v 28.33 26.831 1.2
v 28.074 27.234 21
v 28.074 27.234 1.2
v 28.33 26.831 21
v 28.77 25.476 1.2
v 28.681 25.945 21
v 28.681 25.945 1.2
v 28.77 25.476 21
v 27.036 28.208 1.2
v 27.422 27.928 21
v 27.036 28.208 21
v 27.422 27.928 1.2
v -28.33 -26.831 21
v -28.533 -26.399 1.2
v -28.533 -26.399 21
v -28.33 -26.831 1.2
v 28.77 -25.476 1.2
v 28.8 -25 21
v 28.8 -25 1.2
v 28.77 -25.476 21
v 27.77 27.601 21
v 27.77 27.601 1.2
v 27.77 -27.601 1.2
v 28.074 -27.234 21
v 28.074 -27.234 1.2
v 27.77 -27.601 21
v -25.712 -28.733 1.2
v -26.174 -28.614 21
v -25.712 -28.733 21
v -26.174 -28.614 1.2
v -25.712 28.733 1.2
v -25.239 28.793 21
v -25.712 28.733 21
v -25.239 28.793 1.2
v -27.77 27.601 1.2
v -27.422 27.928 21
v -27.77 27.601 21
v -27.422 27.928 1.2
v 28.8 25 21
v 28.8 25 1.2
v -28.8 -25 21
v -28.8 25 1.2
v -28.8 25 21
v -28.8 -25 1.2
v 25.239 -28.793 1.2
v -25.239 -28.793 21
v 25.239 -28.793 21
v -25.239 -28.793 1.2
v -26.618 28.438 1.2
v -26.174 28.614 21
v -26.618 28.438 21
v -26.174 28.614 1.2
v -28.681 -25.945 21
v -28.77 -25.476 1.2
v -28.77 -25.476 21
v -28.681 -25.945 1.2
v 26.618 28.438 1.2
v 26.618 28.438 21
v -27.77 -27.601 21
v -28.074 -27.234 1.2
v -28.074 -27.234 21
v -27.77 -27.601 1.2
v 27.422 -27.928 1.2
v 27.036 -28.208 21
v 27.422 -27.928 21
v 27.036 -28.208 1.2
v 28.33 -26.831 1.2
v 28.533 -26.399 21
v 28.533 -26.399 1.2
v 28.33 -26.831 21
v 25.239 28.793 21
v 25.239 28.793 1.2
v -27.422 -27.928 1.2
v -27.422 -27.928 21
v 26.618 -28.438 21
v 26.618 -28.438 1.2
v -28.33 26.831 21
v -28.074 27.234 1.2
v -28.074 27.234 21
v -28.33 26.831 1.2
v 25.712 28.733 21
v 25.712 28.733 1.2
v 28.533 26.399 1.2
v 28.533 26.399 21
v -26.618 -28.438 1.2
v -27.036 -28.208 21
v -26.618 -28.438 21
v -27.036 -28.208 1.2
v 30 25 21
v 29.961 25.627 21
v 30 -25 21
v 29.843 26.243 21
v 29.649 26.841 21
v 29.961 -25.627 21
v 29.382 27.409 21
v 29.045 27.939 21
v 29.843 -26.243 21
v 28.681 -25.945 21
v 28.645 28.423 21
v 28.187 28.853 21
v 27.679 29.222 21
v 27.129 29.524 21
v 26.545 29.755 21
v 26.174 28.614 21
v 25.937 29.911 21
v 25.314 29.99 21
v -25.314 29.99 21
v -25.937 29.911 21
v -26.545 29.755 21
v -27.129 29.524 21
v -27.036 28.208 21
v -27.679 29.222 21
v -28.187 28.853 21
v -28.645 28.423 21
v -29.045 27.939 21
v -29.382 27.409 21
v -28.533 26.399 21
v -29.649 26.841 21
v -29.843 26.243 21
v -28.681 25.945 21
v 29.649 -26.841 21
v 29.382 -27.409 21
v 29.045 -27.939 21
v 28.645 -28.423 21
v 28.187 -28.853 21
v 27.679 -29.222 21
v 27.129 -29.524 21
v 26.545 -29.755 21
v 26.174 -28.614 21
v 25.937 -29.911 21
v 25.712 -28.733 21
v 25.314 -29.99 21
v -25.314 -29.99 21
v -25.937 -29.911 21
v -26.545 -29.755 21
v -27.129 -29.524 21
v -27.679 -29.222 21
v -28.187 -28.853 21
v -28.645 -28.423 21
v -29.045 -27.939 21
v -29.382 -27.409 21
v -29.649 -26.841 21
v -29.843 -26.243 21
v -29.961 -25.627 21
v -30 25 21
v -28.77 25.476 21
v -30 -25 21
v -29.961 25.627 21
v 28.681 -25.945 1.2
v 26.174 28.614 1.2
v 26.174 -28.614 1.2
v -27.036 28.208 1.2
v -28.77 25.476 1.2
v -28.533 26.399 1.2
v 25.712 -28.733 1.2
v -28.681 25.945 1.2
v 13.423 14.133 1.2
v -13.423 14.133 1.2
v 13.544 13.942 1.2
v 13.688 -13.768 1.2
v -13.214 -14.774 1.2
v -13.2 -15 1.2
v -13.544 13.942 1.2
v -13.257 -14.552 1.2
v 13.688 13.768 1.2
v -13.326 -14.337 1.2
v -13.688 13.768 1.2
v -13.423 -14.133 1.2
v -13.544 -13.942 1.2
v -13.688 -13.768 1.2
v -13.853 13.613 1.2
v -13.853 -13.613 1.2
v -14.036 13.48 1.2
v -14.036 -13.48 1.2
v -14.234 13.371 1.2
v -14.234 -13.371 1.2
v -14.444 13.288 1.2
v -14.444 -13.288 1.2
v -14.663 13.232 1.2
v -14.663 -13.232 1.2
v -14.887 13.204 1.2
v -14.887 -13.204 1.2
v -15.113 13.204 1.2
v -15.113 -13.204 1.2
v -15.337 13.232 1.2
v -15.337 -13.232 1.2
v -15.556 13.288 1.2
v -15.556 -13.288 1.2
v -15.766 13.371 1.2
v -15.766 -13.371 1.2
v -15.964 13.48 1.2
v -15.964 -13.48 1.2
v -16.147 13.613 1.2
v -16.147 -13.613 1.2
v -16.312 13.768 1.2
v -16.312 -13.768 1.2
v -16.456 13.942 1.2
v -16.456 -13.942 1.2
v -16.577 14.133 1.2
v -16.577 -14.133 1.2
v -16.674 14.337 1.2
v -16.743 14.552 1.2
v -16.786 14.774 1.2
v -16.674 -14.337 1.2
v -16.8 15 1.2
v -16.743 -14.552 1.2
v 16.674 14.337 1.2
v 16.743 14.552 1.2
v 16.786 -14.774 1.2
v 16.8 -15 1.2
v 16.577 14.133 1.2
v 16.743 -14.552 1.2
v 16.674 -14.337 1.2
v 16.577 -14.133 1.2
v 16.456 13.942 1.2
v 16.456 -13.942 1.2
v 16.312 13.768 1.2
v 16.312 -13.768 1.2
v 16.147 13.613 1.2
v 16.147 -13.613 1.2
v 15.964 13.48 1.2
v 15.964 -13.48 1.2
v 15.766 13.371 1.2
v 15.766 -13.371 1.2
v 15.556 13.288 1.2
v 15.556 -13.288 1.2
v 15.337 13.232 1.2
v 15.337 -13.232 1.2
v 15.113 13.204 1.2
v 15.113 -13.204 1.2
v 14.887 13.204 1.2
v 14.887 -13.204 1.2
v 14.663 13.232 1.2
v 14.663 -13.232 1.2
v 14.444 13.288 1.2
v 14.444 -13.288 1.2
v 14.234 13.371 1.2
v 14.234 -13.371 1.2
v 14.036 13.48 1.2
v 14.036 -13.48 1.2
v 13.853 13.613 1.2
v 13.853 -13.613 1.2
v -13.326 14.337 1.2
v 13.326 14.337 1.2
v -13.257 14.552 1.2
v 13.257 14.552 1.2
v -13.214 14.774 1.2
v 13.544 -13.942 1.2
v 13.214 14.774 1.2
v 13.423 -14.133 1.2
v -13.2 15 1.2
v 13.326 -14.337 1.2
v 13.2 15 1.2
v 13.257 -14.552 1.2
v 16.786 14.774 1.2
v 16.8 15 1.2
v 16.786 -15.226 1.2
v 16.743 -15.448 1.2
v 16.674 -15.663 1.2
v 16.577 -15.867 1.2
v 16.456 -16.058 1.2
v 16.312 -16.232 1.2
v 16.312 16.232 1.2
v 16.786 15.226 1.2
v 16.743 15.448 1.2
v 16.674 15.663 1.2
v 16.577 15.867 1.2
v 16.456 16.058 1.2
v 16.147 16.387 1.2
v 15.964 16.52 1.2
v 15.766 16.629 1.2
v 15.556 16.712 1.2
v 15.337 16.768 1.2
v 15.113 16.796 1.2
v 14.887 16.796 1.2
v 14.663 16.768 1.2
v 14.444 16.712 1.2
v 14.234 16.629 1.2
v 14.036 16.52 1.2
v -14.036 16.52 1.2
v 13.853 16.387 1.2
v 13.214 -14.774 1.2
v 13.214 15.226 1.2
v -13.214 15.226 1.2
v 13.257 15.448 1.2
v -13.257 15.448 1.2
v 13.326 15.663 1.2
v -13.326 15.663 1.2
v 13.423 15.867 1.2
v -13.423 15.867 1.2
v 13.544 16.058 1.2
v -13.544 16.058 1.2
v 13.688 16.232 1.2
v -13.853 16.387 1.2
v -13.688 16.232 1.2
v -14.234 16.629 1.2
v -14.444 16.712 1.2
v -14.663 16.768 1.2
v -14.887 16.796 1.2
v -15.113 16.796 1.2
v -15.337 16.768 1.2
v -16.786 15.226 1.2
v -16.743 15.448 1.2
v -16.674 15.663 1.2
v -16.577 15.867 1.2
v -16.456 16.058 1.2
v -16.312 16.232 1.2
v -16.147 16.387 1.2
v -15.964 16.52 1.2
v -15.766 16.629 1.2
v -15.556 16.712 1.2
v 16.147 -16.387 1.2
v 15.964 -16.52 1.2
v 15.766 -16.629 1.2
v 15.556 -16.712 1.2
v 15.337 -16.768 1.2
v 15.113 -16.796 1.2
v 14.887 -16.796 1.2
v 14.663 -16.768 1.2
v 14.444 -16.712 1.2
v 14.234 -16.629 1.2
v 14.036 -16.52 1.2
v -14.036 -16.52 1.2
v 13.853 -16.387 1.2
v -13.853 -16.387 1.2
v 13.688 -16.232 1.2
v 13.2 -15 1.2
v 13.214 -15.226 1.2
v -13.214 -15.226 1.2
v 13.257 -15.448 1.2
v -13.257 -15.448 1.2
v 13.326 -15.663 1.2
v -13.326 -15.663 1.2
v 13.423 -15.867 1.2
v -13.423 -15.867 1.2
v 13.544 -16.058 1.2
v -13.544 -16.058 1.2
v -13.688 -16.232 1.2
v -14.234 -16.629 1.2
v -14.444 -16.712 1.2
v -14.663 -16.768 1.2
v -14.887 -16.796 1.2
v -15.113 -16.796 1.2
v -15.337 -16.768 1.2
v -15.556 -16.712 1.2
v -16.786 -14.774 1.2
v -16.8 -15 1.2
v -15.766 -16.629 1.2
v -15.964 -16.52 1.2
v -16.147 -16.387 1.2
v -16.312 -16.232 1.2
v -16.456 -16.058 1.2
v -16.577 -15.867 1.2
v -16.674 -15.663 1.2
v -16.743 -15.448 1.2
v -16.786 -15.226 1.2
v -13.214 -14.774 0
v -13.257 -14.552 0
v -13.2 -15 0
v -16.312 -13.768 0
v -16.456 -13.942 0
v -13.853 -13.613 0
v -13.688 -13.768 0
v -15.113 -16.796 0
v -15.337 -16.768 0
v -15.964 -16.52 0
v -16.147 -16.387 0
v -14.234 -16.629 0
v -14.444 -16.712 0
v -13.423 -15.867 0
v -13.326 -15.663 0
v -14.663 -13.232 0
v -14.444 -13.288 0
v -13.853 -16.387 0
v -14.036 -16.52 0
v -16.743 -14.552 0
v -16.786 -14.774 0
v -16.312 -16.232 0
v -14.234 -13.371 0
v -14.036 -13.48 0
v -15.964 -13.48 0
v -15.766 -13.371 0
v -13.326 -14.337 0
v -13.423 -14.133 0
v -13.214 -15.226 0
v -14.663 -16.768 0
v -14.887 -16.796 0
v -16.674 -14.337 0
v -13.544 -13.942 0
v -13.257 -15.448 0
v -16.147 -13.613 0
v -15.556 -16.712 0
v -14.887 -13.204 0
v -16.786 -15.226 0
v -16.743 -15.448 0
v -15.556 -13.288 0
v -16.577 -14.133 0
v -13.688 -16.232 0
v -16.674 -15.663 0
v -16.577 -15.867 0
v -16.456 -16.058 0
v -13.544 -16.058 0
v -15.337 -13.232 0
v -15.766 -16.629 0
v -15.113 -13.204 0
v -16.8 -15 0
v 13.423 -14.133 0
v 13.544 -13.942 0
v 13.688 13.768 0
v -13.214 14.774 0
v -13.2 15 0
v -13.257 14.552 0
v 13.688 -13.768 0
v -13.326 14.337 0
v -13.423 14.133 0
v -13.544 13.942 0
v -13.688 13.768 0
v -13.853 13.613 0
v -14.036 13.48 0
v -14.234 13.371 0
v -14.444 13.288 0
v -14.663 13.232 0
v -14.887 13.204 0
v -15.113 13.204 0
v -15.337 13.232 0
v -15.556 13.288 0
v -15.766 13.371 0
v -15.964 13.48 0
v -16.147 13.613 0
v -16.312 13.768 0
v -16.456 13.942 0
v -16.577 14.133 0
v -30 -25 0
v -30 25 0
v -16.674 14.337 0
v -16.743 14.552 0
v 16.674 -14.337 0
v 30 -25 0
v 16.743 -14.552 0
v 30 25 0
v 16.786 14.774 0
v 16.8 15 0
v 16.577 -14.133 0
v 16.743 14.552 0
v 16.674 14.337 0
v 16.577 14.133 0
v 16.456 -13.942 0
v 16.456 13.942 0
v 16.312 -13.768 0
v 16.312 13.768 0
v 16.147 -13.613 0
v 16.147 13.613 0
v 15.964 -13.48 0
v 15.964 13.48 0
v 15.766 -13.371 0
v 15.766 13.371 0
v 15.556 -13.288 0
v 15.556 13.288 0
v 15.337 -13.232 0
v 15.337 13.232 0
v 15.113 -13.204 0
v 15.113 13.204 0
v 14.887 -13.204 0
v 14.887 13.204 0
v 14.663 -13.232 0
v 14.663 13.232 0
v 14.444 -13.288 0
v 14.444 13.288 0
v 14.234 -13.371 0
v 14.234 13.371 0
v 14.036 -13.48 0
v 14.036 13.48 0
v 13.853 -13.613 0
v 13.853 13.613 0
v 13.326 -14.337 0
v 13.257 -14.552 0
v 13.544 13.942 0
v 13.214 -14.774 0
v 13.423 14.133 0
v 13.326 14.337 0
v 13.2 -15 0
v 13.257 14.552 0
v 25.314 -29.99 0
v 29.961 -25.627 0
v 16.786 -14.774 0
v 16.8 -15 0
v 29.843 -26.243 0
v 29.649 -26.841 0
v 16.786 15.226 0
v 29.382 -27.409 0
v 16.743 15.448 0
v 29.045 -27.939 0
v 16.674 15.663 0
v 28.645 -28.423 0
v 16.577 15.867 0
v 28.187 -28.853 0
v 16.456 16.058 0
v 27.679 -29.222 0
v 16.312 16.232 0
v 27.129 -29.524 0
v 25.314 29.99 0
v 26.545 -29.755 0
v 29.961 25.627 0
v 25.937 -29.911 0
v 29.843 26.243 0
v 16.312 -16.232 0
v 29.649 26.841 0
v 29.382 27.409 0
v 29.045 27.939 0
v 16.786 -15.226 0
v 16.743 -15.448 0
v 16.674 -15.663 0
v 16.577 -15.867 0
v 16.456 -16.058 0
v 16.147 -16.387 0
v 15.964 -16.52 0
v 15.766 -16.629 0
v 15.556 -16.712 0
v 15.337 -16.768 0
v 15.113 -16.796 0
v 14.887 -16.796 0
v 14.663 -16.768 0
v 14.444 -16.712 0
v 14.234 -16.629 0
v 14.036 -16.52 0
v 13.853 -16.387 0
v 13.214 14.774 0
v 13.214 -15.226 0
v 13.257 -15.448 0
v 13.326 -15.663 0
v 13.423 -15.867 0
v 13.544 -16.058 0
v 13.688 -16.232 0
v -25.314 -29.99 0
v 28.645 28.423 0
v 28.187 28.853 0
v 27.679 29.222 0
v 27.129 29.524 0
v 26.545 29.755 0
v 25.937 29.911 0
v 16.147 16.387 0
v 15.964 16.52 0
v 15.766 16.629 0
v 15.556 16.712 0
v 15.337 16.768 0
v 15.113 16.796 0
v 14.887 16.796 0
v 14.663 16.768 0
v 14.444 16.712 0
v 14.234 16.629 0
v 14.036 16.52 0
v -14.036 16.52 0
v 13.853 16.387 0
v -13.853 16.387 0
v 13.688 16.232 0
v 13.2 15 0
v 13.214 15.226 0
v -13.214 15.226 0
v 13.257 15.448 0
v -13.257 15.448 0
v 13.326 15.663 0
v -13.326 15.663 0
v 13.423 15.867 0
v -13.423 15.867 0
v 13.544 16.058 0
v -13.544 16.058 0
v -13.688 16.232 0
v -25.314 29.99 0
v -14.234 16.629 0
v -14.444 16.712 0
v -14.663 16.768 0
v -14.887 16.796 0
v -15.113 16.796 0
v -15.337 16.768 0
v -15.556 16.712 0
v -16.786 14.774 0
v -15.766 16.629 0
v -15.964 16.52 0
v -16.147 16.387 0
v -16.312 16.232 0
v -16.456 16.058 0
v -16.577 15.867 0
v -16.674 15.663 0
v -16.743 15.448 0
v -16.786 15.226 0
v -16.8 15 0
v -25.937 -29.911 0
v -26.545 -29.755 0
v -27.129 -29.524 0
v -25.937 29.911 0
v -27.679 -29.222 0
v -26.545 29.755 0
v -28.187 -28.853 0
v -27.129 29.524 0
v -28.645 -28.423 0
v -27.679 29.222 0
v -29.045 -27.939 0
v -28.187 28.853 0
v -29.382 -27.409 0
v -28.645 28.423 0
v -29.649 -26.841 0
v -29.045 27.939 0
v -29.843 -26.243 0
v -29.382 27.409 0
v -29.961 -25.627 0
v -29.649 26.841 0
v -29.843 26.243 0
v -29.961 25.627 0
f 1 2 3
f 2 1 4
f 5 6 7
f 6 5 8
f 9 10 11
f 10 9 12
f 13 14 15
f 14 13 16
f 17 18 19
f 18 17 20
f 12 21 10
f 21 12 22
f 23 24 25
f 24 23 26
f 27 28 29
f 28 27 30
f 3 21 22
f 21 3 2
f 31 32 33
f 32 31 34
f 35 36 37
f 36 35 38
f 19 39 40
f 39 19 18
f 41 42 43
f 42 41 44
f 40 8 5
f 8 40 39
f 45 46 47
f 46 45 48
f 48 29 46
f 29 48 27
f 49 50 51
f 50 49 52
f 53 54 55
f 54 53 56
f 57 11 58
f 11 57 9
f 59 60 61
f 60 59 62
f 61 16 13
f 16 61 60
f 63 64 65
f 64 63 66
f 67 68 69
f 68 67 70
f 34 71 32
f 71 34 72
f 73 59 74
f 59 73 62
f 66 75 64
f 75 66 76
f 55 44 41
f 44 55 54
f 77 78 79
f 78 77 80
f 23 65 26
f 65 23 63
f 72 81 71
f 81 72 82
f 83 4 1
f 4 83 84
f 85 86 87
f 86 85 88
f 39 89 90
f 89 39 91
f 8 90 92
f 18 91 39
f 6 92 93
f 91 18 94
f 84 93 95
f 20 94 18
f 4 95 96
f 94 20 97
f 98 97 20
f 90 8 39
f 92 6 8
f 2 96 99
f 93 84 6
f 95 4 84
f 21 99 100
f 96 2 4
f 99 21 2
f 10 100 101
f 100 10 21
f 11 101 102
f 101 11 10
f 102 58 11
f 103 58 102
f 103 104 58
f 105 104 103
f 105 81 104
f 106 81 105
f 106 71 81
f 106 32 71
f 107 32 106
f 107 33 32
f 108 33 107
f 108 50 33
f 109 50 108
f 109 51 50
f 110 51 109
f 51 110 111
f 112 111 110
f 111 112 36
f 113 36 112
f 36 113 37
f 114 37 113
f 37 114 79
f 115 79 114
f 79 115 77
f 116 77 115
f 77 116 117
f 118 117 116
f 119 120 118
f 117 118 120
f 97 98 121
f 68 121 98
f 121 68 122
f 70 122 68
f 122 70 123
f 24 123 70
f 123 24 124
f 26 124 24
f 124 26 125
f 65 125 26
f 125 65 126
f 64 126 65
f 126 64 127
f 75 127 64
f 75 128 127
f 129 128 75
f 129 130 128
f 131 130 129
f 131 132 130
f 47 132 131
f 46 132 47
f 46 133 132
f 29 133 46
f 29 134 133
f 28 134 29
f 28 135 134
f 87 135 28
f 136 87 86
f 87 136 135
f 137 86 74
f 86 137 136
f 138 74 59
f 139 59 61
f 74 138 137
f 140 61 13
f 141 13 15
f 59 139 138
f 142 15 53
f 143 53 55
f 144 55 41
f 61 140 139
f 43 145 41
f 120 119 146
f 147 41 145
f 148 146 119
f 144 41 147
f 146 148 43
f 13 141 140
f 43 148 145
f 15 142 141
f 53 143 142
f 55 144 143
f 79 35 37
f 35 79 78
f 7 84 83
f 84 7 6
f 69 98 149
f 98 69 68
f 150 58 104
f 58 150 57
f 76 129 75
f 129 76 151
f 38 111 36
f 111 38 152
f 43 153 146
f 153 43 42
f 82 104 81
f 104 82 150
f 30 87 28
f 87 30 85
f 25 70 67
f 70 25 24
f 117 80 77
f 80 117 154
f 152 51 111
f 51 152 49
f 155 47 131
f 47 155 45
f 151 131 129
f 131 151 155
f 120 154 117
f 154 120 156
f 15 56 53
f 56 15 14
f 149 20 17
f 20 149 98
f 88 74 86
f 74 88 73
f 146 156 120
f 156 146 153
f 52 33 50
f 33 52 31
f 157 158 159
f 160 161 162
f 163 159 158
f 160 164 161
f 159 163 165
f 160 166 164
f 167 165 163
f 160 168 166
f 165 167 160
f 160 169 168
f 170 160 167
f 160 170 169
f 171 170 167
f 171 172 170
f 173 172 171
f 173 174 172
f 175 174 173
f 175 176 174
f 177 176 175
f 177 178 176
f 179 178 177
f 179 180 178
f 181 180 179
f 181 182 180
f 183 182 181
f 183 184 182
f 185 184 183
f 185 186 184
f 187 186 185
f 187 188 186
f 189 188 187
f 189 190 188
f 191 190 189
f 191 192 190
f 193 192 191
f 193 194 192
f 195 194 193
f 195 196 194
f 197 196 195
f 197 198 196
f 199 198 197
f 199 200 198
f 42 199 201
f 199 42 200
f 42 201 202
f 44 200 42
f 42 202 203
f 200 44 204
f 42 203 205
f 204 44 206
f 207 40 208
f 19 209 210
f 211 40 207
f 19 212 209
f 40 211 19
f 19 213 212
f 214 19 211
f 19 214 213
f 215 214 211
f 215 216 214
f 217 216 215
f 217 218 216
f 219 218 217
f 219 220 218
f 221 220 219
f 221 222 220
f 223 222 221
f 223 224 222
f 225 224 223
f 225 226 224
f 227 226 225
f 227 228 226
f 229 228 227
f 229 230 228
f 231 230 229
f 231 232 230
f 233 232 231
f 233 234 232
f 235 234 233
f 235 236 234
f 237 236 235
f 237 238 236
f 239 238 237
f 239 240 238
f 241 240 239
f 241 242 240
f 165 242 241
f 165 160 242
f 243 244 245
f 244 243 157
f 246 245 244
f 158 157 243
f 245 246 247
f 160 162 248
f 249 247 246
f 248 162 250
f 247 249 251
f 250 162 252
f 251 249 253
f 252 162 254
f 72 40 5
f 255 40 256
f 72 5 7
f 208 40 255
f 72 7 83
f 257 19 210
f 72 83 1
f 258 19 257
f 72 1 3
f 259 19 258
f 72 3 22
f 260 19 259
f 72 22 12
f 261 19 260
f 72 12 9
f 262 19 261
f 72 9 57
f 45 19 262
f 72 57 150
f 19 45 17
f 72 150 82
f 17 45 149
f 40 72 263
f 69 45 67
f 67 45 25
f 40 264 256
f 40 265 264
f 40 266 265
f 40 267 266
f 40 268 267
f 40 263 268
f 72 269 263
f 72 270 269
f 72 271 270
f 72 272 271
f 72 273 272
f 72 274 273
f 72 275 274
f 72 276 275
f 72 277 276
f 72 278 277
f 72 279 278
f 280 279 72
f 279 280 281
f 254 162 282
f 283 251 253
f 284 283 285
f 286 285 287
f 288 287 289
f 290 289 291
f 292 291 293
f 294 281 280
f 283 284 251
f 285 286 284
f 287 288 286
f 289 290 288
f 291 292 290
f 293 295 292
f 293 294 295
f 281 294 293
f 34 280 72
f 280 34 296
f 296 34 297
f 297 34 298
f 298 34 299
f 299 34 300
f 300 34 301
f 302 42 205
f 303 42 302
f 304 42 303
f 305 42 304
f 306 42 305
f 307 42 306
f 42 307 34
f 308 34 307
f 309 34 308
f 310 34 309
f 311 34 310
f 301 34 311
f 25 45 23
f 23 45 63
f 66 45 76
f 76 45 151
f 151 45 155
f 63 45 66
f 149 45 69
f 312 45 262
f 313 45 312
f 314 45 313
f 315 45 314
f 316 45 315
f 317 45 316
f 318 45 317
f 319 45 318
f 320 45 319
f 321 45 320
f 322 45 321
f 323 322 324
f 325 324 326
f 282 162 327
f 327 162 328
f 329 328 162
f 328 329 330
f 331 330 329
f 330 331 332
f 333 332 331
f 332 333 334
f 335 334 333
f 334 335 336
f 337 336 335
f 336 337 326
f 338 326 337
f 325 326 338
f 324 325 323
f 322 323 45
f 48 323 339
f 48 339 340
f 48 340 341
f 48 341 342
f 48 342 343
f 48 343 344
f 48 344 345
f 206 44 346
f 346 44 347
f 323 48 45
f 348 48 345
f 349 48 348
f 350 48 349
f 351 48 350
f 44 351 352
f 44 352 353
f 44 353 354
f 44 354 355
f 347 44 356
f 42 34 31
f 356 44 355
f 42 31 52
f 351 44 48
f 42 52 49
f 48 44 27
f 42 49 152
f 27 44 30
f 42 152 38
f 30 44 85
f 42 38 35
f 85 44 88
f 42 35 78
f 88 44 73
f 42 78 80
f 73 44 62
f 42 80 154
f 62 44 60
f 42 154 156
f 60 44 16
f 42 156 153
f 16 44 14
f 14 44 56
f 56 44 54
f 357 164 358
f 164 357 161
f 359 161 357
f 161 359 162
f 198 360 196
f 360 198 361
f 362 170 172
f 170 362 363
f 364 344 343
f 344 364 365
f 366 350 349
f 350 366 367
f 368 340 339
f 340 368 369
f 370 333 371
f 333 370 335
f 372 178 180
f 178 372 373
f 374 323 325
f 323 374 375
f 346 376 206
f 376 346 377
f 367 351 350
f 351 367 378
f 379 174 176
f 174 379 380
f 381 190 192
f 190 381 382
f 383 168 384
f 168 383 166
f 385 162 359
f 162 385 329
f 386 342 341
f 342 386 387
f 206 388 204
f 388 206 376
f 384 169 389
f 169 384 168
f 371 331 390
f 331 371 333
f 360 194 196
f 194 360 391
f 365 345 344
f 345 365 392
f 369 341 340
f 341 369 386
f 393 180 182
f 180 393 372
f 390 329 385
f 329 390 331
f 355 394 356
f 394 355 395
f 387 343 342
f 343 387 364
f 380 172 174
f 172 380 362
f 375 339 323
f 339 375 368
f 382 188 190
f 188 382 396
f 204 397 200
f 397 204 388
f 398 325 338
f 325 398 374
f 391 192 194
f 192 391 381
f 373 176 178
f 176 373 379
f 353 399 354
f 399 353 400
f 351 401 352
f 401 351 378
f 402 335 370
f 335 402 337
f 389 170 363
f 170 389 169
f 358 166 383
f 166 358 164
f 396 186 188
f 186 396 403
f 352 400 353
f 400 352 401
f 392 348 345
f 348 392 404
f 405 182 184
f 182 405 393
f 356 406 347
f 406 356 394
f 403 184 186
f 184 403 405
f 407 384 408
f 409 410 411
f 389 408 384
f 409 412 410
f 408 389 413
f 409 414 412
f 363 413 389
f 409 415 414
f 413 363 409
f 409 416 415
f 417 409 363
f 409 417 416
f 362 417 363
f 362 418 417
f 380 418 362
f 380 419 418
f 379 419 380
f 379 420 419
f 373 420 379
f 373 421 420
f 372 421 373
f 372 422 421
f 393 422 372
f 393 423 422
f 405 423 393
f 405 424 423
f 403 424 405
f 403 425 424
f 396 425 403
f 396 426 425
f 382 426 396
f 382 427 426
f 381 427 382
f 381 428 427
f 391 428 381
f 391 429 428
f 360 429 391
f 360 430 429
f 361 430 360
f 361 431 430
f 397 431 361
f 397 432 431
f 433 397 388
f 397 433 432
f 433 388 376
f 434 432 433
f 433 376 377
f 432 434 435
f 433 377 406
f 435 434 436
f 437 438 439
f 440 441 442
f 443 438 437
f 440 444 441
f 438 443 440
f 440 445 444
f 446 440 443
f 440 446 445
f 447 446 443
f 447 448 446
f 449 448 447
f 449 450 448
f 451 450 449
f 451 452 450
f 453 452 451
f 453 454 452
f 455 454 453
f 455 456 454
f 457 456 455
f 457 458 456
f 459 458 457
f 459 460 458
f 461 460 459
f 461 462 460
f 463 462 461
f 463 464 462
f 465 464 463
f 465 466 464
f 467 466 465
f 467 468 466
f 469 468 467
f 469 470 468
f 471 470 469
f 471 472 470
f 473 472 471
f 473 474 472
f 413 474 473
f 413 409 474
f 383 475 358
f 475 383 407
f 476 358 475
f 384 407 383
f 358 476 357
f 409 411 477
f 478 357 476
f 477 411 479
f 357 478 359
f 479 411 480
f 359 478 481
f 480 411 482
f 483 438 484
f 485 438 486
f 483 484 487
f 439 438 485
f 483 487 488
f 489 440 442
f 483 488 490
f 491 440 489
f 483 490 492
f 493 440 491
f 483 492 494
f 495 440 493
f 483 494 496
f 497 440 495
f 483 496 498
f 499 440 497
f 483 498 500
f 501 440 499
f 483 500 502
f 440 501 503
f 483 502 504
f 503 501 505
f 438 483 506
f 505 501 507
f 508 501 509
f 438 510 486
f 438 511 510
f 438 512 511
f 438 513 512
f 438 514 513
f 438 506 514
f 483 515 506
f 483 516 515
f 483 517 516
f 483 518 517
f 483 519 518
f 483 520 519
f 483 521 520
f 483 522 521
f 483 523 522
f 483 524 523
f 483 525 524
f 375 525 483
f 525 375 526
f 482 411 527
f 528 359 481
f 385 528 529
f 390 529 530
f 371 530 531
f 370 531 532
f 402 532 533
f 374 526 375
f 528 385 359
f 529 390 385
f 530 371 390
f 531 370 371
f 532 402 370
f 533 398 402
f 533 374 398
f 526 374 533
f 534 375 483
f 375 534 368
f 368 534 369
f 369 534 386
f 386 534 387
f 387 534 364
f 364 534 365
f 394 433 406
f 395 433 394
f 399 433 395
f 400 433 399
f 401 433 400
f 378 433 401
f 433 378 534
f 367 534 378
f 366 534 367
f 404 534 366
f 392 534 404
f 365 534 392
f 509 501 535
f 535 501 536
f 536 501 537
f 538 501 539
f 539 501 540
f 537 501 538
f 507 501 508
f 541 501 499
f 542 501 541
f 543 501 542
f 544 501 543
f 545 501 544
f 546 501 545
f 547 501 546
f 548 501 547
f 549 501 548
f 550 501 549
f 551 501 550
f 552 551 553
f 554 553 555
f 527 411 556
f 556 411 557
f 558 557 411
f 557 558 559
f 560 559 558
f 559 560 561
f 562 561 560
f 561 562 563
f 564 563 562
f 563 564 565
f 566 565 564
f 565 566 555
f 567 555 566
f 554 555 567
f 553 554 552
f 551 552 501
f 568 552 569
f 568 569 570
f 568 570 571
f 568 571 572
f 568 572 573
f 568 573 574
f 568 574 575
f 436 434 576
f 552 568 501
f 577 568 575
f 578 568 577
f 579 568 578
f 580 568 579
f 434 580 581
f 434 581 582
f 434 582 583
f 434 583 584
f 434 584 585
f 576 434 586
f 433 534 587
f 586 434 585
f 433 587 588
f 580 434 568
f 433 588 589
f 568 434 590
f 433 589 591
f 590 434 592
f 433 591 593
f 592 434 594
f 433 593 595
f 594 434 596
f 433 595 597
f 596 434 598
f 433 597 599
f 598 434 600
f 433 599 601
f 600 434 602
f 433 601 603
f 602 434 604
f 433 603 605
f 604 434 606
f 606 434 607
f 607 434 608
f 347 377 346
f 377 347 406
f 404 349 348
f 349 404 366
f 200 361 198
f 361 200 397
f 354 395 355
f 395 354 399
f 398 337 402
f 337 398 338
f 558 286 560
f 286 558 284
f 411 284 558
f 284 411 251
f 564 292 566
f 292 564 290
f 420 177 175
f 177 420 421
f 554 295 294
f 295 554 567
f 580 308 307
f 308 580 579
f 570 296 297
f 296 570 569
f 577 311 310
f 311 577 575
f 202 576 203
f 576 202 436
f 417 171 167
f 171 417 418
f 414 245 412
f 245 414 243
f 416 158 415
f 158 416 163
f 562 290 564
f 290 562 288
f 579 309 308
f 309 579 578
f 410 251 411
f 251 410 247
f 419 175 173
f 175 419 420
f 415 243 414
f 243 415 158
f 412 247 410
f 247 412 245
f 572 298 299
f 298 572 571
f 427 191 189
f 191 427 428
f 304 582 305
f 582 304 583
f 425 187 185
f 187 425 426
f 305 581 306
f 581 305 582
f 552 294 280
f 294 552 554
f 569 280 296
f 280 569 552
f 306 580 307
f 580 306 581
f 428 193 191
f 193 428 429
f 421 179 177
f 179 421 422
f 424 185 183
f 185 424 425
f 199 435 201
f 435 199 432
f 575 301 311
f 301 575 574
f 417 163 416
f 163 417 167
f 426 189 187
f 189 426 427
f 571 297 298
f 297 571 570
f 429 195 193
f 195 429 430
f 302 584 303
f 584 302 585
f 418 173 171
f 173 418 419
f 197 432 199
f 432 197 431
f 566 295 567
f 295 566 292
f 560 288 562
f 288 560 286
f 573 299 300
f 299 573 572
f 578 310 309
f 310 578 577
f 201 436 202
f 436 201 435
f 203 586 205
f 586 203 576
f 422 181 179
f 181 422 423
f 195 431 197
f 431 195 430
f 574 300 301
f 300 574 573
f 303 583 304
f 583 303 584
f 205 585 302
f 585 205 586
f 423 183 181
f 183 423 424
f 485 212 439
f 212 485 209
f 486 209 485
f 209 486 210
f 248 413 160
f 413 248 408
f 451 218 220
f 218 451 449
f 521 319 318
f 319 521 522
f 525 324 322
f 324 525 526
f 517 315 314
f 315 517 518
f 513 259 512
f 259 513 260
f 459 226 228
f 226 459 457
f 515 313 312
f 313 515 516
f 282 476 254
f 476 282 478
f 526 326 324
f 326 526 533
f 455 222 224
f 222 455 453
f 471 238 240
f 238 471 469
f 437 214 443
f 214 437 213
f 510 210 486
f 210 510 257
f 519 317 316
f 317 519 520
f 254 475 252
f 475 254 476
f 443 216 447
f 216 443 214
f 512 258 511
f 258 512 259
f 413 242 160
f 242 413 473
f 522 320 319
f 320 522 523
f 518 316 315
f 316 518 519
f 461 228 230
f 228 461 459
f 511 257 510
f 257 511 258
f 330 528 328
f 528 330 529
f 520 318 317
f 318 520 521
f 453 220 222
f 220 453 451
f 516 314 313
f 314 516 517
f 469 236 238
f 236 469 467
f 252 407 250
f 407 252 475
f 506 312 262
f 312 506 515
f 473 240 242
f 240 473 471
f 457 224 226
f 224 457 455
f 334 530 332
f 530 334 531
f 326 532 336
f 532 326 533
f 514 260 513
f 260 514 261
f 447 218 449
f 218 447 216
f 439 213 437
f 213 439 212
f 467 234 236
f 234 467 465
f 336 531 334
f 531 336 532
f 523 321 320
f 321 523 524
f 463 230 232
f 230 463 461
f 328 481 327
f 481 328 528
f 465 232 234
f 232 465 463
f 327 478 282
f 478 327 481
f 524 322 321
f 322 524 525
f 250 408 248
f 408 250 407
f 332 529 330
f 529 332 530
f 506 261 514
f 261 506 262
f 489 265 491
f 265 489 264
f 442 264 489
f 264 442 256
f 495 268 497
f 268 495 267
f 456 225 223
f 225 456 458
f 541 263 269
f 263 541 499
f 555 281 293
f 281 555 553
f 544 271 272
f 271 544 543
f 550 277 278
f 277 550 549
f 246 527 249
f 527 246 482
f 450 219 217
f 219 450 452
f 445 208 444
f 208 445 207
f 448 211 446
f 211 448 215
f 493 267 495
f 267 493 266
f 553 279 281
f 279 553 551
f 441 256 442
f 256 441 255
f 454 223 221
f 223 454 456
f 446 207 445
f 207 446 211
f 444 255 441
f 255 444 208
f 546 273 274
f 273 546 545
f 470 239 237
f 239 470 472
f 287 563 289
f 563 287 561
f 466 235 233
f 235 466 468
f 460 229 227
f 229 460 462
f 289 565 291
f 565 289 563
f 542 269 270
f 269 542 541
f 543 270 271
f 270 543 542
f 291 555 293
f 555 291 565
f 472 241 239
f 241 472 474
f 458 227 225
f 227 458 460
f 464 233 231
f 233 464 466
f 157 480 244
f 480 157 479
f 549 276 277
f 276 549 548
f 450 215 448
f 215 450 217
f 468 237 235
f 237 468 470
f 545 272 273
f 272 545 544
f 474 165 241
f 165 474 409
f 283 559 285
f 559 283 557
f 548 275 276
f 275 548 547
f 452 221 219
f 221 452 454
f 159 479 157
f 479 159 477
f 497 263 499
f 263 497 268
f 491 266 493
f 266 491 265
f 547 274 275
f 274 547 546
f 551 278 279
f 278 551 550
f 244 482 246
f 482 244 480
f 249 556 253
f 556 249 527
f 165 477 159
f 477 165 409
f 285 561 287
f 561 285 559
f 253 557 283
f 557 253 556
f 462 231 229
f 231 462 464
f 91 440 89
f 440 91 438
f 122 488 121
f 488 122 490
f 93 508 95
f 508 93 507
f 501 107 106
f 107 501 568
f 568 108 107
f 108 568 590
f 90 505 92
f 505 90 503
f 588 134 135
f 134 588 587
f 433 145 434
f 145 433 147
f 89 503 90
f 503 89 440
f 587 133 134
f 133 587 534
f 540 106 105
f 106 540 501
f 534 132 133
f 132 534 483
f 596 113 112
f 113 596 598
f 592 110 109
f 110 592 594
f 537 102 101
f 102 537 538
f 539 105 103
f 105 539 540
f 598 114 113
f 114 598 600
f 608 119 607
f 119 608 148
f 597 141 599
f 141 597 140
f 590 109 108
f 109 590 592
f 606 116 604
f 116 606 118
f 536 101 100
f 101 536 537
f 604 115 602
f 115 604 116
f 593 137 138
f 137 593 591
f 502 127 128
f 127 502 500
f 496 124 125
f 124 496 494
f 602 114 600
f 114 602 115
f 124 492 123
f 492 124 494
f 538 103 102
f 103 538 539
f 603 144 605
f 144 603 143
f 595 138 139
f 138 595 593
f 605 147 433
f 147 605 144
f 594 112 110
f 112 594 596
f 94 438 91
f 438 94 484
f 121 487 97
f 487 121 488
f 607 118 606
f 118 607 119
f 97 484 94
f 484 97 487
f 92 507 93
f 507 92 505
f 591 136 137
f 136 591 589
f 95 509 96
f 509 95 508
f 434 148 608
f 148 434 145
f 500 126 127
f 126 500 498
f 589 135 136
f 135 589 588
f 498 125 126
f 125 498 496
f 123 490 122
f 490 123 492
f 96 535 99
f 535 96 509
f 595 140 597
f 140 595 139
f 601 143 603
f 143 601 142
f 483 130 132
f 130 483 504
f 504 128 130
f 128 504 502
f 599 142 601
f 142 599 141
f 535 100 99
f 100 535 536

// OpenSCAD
$fn = 50;


difference() {
	union() {
		hull() {
			translate(v = [-25.0000000000, 25.0000000000, 0]) {
				cylinder(h = 21, r = 5);
			}
			translate(v = [25.0000000000, 25.0000000000, 0]) {
				cylinder(h = 21, r = 5);
			}
			translate(v = [-25.0000000000, -25.0000000000, 0]) {
				cylinder(h = 21, r = 5);
			}
			translate(v = [25.0000000000, -25.0000000000, 0]) {
				cylinder(h = 21, r = 5);
			}
		}
	}
	union() {
		translate(v = [0, 0, 1.2000000000]) {
			hull() {
				translate(v = [-25.0000000000, 25.0000000000, 0]) {
					cylinder(h = 19.8000000000, r = 3.8000000000);
				}
				translate(v = [25.0000000000, 25.0000000000, 0]) {
					cylinder(h = 19.8000000000, r = 3.8000000000);
				}
				translate(v = [-25.0000000000, -25.0000000000, 0]) {
					cylinder(h = 19.8000000000, r = 3.8000000000);
				}
				translate(v = [25.0000000000, -25.0000000000, 0]) {
					cylinder(h = 19.8000000000, r = 3.8000000000);
				}
			}
		}
		#translate(v = [-15.0000000000, -15.0000000000, 0]) {
			cylinder(h = 1.2000000000, r = 1.8000000000);
		}
		#translate(v = [-15.0000000000, 15.0000000000, 0]) {
			cylinder(h = 1.2000000000, r = 1.8000000000);
		}
		#translate(v = [15.0000000000, -15.0000000000, 0]) {
			cylinder(h = 1.2000000000, r = 1.8000000000);
		}
		#translate(v = [15.0000000000, 15.0000000000, 0]) {
			cylinder(h = 1.2000000000, r = 1.8000000000);
		}
	}
}
